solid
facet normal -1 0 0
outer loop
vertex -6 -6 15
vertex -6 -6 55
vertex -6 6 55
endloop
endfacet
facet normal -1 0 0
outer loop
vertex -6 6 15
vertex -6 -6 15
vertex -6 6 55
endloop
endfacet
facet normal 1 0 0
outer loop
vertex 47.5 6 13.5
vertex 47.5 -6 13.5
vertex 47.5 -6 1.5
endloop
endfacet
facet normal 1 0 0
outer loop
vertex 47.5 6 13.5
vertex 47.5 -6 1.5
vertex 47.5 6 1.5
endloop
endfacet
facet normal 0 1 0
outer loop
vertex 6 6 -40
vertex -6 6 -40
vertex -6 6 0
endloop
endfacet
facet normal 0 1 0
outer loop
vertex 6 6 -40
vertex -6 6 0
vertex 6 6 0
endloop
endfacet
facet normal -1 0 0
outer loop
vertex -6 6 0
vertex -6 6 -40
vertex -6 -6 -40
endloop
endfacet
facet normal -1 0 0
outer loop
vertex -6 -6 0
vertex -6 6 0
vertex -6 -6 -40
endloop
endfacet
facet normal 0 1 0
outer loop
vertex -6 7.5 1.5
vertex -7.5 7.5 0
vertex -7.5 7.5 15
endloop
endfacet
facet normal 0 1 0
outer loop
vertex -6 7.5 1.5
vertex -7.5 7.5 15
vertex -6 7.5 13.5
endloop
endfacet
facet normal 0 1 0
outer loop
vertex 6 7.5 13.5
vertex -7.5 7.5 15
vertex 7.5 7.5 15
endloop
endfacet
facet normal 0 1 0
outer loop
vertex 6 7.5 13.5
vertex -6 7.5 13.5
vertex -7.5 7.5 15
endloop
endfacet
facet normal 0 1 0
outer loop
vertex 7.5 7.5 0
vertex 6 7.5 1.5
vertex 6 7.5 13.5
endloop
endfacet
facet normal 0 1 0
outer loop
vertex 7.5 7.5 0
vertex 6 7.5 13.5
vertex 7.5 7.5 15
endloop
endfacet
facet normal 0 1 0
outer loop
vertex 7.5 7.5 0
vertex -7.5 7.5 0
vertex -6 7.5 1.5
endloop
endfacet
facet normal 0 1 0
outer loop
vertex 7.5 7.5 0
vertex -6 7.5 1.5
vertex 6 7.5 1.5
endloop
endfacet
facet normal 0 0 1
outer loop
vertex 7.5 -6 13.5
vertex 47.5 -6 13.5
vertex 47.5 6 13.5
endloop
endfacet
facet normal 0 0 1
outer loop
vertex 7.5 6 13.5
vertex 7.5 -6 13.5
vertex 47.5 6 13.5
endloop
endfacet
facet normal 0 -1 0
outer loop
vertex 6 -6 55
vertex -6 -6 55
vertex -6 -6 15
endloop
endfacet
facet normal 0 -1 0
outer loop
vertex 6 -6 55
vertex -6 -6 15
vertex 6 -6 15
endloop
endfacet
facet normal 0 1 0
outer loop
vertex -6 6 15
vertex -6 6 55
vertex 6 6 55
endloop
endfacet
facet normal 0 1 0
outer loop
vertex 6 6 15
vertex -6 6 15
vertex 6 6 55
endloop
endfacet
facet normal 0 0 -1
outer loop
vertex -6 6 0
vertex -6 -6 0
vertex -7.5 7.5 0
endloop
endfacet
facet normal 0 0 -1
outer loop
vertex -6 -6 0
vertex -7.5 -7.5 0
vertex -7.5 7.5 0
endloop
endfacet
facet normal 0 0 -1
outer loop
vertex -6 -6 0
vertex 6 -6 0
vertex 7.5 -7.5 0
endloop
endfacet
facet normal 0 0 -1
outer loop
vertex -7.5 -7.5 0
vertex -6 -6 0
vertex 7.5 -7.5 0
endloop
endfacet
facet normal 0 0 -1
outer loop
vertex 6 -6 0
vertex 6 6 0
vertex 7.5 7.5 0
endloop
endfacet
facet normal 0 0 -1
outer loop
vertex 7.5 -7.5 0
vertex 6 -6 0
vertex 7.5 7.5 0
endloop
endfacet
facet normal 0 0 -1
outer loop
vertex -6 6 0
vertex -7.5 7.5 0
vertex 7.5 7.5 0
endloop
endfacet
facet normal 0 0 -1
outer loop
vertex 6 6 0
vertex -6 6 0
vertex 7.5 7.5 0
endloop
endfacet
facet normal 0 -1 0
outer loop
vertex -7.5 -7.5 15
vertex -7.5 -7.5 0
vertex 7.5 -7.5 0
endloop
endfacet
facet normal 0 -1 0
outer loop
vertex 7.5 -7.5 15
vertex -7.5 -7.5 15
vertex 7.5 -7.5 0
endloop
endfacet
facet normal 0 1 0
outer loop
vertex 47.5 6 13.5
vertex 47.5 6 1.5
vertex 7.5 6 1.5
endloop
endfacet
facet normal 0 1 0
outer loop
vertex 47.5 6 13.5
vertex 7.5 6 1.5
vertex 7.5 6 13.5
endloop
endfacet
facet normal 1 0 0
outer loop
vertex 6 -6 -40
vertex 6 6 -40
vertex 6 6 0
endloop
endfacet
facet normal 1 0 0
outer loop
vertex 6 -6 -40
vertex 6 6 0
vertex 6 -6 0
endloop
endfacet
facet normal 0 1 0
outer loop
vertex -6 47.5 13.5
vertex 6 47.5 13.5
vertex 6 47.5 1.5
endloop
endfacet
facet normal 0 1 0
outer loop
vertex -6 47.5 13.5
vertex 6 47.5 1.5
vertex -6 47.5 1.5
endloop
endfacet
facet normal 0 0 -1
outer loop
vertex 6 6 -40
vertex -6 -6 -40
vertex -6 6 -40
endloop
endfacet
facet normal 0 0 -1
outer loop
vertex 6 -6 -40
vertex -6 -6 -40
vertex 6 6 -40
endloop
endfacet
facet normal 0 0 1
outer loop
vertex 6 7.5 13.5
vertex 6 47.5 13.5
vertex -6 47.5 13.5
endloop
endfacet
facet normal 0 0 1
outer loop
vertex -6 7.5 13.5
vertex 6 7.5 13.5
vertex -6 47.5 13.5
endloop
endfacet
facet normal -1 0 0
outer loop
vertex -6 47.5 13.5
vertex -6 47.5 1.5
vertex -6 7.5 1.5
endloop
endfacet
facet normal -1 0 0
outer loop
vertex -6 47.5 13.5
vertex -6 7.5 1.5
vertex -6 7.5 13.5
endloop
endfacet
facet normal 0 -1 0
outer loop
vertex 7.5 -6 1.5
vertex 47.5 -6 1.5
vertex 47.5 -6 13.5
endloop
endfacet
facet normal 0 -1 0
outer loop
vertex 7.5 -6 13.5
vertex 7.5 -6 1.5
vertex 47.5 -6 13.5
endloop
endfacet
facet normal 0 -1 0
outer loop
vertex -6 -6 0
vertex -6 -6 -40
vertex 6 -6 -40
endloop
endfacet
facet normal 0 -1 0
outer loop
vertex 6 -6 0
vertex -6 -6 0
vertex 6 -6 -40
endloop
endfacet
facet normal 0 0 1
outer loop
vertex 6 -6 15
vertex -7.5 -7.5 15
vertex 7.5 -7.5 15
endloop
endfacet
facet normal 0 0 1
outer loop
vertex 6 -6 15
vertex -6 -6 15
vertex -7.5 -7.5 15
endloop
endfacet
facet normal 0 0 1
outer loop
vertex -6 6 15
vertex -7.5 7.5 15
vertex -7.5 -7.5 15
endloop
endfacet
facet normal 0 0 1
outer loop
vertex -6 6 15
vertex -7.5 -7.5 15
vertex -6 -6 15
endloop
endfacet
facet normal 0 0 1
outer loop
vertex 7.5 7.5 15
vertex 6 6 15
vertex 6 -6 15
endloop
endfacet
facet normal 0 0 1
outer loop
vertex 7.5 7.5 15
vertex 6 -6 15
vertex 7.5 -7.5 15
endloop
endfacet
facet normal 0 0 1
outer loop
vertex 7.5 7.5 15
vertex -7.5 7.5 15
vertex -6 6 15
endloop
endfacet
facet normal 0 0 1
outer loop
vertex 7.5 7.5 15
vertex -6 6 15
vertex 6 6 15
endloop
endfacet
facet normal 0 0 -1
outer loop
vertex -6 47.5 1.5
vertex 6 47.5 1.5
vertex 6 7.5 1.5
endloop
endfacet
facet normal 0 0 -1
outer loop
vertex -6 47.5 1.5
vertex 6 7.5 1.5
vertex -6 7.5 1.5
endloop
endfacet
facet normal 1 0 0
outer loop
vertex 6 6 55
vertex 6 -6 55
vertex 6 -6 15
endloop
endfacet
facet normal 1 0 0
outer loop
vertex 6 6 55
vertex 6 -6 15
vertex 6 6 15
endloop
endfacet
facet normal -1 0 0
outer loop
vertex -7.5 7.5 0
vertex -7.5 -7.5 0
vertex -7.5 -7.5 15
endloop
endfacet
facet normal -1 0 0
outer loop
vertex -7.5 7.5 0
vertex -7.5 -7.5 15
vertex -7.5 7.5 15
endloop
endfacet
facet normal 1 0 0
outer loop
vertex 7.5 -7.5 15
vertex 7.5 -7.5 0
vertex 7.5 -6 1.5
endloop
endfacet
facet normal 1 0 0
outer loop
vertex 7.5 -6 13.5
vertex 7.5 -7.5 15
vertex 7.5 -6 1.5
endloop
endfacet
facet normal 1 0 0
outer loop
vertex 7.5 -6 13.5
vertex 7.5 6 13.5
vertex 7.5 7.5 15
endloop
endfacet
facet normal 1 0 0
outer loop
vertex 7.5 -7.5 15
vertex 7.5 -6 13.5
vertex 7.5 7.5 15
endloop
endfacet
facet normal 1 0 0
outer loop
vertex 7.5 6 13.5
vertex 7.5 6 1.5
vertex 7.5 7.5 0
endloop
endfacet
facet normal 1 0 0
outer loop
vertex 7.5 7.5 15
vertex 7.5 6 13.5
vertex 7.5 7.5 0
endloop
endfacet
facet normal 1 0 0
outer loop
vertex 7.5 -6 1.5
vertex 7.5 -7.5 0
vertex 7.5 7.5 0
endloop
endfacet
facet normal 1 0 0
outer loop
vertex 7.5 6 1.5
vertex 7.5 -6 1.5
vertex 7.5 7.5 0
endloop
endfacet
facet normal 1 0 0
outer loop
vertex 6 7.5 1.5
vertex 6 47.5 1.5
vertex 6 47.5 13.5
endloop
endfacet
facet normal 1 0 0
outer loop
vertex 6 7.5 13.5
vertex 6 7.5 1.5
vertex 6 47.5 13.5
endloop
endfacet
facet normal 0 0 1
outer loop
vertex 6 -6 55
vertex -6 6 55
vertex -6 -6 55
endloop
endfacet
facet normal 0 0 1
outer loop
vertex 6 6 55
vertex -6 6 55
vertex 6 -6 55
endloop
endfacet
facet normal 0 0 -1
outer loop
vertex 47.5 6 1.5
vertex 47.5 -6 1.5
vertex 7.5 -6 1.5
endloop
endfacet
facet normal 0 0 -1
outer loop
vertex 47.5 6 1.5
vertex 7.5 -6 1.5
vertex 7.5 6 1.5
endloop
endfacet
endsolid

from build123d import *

# Parameters (mm, degrees)
SKETCH_W     = 15
SKETCH_H     = 15
PAD_DEPTH    = 15
SKETCH001_W  = 12
SKETCH001_H  = 12
PAD001_DEPTH = 40
SKETCH003_W  = 12
SKETCH003_H  = 12
PAD003_DEPTH = 40
SKETCH002_W  = 12
SKETCH002_H  = 12
PAD002_DEPTH = 40
SKETCH004_W  = 12
SKETCH004_H  = 12
PAD004_DEPTH = 40


with BuildPart() as pad001:
    # Sketch → Pad (new body)
    with BuildSketch(Plane.XY):
        Rectangle(SKETCH_W, SKETCH_H)
    extrude(amount=PAD_DEPTH)

    # Sketch001 → Pad001 (new body)
    with BuildSketch(Plane.XY.offset(15)):
        Rectangle(SKETCH001_W, SKETCH001_H)
    extrude(amount=PAD001_DEPTH)


with BuildPart() as pad003:
    # Pad003 base: copy of Pad001
    add(pad001.part)

    # Sketch003 → Pad003 (new body)
    with BuildSketch(Plane(origin=(0, 0, 0), x_dir=(1, 0, 0), z_dir=(0, 0, -1))):
        Rectangle(SKETCH003_W, SKETCH003_H)
    extrude(amount=PAD003_DEPTH)


with BuildPart() as fusion:
    # Pad002 base: copy of Pad001
    add(pad001.part)

    # Sketch002 → Pad002 (new body)
    with BuildSketch(Plane(origin=(0, 7.5, 0), x_dir=(-1, 0, 0), z_dir=(0, 1, 0))):
        with Locations((0, 7.5)):
            Rectangle(SKETCH002_W, SKETCH002_H)
    extrude(amount=PAD002_DEPTH)

    # Sketch004 → Pad004 (new body)
    with BuildSketch(Plane.YZ.offset(7.5)):
        with Locations((0, 7.5)):
            Rectangle(SKETCH004_W, SKETCH004_H)
    extrude(amount=PAD004_DEPTH)

    # Fusion: union Pad003
    add(pad003.part)


solid = fusion.part
